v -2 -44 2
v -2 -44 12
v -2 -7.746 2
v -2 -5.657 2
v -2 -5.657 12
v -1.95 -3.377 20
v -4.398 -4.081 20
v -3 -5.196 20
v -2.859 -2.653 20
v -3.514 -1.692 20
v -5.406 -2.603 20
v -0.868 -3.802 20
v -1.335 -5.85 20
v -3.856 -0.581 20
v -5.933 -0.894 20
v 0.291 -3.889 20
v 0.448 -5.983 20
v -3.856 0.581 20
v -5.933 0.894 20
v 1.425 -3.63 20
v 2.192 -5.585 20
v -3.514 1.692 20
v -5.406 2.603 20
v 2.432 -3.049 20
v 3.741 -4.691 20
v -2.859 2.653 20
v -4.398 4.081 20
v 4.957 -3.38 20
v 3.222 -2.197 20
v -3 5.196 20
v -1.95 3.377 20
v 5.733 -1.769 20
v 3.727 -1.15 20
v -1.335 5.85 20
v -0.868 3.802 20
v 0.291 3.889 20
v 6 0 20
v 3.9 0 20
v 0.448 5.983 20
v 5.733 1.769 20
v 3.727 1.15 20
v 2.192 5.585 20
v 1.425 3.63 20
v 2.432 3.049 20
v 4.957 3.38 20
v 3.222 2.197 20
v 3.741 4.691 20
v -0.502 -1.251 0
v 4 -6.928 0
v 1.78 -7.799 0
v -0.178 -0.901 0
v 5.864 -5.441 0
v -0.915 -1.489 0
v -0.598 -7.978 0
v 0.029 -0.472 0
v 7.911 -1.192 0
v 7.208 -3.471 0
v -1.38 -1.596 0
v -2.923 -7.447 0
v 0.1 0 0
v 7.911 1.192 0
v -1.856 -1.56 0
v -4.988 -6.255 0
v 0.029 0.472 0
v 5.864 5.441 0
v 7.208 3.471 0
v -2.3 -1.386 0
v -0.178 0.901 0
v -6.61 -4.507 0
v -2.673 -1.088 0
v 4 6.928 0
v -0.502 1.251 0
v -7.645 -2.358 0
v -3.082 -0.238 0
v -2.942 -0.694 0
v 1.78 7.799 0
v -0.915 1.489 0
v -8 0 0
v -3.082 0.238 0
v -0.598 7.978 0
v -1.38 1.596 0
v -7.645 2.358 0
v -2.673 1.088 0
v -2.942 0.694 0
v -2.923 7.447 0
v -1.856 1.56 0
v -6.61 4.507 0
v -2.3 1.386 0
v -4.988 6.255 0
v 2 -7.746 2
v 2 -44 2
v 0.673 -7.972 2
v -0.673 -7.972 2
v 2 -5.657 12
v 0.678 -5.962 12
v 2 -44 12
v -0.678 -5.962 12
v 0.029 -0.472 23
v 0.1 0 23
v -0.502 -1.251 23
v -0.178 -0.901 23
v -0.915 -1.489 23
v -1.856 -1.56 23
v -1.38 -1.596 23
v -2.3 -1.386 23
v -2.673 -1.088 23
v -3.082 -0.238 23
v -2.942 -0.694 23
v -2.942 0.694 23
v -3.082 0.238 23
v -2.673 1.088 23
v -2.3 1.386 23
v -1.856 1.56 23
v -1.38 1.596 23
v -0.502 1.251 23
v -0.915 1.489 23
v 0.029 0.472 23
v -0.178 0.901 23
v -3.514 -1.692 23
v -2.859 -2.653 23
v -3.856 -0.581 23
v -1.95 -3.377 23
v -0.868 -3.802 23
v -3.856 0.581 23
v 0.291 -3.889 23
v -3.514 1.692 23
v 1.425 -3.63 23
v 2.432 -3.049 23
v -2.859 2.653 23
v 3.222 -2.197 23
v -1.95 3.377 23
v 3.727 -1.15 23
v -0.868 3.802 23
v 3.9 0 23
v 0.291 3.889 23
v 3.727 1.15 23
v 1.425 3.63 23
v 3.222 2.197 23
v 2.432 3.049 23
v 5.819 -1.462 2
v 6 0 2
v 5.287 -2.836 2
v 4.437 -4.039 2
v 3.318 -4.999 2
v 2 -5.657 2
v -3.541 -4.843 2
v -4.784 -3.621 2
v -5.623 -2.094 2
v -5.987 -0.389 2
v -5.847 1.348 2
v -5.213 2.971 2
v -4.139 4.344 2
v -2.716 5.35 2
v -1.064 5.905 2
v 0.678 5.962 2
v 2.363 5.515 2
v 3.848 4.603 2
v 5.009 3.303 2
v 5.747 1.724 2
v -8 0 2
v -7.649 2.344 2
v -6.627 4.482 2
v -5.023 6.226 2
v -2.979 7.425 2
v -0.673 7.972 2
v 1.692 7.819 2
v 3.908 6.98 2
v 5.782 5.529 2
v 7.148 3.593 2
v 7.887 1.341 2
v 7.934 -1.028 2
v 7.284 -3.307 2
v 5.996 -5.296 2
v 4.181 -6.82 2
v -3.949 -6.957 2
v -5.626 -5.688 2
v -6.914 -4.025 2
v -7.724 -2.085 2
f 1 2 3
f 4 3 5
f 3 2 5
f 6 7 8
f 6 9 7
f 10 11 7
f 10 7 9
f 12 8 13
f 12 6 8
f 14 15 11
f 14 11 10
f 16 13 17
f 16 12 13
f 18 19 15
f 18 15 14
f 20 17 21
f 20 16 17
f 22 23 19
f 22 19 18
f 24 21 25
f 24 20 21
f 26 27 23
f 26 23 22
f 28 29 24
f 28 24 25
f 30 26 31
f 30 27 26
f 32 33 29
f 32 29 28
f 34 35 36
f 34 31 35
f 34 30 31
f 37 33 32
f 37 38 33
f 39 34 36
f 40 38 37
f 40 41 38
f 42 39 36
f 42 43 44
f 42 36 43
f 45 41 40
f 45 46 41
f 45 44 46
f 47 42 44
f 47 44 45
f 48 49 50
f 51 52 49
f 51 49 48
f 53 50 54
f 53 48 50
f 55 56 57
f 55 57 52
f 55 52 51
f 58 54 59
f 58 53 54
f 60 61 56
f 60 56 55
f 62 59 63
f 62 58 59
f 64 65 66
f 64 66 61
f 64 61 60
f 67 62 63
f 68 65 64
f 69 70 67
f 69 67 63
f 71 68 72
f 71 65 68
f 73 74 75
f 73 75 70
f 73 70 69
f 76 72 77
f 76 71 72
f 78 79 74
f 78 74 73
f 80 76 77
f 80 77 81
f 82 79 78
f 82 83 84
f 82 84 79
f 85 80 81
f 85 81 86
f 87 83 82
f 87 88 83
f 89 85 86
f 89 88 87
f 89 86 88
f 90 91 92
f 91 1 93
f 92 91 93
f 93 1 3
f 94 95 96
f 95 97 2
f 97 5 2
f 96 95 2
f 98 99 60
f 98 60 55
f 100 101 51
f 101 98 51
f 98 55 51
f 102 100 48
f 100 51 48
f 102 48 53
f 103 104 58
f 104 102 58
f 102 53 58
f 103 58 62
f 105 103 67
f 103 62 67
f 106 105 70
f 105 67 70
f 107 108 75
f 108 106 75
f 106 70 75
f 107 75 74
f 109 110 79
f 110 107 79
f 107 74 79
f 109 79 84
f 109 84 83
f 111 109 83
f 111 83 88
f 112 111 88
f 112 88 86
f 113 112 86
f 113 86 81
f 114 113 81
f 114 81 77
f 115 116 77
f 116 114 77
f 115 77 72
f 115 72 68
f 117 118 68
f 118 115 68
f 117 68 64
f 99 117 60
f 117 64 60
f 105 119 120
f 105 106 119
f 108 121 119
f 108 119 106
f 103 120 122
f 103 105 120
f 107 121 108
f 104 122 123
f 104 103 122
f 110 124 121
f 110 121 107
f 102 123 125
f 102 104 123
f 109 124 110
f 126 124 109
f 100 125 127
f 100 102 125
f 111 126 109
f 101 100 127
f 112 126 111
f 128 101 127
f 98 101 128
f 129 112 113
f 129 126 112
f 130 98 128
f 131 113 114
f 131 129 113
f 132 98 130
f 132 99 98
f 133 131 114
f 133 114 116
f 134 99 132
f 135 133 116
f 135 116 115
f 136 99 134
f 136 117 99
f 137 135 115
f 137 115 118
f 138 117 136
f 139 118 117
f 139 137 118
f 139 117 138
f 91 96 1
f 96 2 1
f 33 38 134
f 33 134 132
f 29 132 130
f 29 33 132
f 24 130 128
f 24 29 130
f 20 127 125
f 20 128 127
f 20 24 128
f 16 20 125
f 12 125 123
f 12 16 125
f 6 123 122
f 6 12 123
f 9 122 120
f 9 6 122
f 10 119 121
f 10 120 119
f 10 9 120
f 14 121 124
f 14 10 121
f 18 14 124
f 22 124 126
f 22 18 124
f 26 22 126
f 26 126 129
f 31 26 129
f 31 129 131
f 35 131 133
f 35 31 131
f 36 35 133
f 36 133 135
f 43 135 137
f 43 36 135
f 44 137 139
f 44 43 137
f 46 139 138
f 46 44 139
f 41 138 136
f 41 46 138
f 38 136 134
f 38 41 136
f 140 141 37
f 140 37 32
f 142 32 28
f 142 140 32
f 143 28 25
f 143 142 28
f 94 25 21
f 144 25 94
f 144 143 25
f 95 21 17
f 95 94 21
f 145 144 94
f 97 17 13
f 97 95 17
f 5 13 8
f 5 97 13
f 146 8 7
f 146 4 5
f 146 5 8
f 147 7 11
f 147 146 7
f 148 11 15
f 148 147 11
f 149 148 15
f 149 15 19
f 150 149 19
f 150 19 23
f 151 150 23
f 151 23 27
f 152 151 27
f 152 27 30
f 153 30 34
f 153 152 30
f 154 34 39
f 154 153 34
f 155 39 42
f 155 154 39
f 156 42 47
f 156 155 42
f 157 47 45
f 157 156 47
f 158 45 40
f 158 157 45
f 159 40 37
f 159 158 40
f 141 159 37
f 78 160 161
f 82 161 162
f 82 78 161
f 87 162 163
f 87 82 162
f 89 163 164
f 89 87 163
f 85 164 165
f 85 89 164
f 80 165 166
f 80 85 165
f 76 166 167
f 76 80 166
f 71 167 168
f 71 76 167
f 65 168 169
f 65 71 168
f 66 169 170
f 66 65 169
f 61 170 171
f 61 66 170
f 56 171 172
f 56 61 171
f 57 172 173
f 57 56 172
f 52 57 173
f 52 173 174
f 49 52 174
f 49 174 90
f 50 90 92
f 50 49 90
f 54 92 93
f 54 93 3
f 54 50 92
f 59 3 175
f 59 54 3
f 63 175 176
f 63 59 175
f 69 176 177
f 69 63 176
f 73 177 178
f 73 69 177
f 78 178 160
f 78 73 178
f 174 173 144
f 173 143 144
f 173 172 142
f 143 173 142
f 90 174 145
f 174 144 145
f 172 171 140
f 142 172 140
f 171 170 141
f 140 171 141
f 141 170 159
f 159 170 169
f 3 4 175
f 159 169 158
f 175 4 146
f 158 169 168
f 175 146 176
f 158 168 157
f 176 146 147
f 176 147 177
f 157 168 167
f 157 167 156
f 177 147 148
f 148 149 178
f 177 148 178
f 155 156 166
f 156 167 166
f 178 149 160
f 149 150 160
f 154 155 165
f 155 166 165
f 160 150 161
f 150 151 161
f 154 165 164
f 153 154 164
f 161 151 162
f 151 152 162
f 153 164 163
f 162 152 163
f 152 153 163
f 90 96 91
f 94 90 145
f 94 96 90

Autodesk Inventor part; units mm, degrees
ref_plane "YZ Plane" through (0, 0, 0) normal (1, 0, 0) x (0, 1, 0)
ref_plane "XZ Plane" through (0, 0, 0) normal (0, 1, 0) x (-1, 0, 0)
ref_plane "XY Plane" through (0, 0, 0) normal (0, 0, 1) x (1, 0, 0)
sketch "Sketch1" plane through (0, 0, 0) normal (0, 0, 1) x (1, 0, 0)
  circle A0 centre (0, 0) radius 6
  circle A1 centre (-1.5, 0) radius 1.6
  dimension "d1" = 12
  dimension "d8" = 3.2
  dimension "d9" = 1.5
extrude "Extrusion1" add sketch "Sketch1" along normal blind 20
sketch "Sketch2" plane through (0, 0, 20) normal (0, 0, 1) x (1, 0, 0)
  circle A0 centre (0, 0) radius 3.9
  circle A1 centre (-1.5, 0) radius 1.6 projected
  dimension "d4" = 7.8
extrude "Extrusion2" add sketch "Sketch2" along normal blind 3
sketch "Sketch3" plane through (0, 0, 0) normal (0, 0, -1) x (-1, 0, 0)
  circle A0 centre (0, 0) radius 8
  circle A1 centre (0, 0) radius 6 projected
  dimension "d10" = 16
extrude "Extrusion3" add sketch "Sketch3" against normal blind 2
sketch "Sketch5" plane through (0, 0, 0) normal (1, 0, 0) x (0, 1, 0)
  line L0 (-44, 2) -> (-4, 2)
  line L1 (-4, 2) -> (-4, 12)
  line L2 (-4, 12) -> (-44, 12)
  line L3 (-44, 12) -> (-44, 2)
  line L4 (-8, 0) -> (8, 0) projected
  line L5 (-8, 0) -> (-8, 2) projected
  point P0 (0, 0)
  dimension "d22" = 40
  dimension "d24" = 10
  dimension "d25" = 4
  dimension "d26" = 0
extrude "Extrusion5" add sketch "Sketch5" along normal mid plane 4
properties part number "spacer off center"
